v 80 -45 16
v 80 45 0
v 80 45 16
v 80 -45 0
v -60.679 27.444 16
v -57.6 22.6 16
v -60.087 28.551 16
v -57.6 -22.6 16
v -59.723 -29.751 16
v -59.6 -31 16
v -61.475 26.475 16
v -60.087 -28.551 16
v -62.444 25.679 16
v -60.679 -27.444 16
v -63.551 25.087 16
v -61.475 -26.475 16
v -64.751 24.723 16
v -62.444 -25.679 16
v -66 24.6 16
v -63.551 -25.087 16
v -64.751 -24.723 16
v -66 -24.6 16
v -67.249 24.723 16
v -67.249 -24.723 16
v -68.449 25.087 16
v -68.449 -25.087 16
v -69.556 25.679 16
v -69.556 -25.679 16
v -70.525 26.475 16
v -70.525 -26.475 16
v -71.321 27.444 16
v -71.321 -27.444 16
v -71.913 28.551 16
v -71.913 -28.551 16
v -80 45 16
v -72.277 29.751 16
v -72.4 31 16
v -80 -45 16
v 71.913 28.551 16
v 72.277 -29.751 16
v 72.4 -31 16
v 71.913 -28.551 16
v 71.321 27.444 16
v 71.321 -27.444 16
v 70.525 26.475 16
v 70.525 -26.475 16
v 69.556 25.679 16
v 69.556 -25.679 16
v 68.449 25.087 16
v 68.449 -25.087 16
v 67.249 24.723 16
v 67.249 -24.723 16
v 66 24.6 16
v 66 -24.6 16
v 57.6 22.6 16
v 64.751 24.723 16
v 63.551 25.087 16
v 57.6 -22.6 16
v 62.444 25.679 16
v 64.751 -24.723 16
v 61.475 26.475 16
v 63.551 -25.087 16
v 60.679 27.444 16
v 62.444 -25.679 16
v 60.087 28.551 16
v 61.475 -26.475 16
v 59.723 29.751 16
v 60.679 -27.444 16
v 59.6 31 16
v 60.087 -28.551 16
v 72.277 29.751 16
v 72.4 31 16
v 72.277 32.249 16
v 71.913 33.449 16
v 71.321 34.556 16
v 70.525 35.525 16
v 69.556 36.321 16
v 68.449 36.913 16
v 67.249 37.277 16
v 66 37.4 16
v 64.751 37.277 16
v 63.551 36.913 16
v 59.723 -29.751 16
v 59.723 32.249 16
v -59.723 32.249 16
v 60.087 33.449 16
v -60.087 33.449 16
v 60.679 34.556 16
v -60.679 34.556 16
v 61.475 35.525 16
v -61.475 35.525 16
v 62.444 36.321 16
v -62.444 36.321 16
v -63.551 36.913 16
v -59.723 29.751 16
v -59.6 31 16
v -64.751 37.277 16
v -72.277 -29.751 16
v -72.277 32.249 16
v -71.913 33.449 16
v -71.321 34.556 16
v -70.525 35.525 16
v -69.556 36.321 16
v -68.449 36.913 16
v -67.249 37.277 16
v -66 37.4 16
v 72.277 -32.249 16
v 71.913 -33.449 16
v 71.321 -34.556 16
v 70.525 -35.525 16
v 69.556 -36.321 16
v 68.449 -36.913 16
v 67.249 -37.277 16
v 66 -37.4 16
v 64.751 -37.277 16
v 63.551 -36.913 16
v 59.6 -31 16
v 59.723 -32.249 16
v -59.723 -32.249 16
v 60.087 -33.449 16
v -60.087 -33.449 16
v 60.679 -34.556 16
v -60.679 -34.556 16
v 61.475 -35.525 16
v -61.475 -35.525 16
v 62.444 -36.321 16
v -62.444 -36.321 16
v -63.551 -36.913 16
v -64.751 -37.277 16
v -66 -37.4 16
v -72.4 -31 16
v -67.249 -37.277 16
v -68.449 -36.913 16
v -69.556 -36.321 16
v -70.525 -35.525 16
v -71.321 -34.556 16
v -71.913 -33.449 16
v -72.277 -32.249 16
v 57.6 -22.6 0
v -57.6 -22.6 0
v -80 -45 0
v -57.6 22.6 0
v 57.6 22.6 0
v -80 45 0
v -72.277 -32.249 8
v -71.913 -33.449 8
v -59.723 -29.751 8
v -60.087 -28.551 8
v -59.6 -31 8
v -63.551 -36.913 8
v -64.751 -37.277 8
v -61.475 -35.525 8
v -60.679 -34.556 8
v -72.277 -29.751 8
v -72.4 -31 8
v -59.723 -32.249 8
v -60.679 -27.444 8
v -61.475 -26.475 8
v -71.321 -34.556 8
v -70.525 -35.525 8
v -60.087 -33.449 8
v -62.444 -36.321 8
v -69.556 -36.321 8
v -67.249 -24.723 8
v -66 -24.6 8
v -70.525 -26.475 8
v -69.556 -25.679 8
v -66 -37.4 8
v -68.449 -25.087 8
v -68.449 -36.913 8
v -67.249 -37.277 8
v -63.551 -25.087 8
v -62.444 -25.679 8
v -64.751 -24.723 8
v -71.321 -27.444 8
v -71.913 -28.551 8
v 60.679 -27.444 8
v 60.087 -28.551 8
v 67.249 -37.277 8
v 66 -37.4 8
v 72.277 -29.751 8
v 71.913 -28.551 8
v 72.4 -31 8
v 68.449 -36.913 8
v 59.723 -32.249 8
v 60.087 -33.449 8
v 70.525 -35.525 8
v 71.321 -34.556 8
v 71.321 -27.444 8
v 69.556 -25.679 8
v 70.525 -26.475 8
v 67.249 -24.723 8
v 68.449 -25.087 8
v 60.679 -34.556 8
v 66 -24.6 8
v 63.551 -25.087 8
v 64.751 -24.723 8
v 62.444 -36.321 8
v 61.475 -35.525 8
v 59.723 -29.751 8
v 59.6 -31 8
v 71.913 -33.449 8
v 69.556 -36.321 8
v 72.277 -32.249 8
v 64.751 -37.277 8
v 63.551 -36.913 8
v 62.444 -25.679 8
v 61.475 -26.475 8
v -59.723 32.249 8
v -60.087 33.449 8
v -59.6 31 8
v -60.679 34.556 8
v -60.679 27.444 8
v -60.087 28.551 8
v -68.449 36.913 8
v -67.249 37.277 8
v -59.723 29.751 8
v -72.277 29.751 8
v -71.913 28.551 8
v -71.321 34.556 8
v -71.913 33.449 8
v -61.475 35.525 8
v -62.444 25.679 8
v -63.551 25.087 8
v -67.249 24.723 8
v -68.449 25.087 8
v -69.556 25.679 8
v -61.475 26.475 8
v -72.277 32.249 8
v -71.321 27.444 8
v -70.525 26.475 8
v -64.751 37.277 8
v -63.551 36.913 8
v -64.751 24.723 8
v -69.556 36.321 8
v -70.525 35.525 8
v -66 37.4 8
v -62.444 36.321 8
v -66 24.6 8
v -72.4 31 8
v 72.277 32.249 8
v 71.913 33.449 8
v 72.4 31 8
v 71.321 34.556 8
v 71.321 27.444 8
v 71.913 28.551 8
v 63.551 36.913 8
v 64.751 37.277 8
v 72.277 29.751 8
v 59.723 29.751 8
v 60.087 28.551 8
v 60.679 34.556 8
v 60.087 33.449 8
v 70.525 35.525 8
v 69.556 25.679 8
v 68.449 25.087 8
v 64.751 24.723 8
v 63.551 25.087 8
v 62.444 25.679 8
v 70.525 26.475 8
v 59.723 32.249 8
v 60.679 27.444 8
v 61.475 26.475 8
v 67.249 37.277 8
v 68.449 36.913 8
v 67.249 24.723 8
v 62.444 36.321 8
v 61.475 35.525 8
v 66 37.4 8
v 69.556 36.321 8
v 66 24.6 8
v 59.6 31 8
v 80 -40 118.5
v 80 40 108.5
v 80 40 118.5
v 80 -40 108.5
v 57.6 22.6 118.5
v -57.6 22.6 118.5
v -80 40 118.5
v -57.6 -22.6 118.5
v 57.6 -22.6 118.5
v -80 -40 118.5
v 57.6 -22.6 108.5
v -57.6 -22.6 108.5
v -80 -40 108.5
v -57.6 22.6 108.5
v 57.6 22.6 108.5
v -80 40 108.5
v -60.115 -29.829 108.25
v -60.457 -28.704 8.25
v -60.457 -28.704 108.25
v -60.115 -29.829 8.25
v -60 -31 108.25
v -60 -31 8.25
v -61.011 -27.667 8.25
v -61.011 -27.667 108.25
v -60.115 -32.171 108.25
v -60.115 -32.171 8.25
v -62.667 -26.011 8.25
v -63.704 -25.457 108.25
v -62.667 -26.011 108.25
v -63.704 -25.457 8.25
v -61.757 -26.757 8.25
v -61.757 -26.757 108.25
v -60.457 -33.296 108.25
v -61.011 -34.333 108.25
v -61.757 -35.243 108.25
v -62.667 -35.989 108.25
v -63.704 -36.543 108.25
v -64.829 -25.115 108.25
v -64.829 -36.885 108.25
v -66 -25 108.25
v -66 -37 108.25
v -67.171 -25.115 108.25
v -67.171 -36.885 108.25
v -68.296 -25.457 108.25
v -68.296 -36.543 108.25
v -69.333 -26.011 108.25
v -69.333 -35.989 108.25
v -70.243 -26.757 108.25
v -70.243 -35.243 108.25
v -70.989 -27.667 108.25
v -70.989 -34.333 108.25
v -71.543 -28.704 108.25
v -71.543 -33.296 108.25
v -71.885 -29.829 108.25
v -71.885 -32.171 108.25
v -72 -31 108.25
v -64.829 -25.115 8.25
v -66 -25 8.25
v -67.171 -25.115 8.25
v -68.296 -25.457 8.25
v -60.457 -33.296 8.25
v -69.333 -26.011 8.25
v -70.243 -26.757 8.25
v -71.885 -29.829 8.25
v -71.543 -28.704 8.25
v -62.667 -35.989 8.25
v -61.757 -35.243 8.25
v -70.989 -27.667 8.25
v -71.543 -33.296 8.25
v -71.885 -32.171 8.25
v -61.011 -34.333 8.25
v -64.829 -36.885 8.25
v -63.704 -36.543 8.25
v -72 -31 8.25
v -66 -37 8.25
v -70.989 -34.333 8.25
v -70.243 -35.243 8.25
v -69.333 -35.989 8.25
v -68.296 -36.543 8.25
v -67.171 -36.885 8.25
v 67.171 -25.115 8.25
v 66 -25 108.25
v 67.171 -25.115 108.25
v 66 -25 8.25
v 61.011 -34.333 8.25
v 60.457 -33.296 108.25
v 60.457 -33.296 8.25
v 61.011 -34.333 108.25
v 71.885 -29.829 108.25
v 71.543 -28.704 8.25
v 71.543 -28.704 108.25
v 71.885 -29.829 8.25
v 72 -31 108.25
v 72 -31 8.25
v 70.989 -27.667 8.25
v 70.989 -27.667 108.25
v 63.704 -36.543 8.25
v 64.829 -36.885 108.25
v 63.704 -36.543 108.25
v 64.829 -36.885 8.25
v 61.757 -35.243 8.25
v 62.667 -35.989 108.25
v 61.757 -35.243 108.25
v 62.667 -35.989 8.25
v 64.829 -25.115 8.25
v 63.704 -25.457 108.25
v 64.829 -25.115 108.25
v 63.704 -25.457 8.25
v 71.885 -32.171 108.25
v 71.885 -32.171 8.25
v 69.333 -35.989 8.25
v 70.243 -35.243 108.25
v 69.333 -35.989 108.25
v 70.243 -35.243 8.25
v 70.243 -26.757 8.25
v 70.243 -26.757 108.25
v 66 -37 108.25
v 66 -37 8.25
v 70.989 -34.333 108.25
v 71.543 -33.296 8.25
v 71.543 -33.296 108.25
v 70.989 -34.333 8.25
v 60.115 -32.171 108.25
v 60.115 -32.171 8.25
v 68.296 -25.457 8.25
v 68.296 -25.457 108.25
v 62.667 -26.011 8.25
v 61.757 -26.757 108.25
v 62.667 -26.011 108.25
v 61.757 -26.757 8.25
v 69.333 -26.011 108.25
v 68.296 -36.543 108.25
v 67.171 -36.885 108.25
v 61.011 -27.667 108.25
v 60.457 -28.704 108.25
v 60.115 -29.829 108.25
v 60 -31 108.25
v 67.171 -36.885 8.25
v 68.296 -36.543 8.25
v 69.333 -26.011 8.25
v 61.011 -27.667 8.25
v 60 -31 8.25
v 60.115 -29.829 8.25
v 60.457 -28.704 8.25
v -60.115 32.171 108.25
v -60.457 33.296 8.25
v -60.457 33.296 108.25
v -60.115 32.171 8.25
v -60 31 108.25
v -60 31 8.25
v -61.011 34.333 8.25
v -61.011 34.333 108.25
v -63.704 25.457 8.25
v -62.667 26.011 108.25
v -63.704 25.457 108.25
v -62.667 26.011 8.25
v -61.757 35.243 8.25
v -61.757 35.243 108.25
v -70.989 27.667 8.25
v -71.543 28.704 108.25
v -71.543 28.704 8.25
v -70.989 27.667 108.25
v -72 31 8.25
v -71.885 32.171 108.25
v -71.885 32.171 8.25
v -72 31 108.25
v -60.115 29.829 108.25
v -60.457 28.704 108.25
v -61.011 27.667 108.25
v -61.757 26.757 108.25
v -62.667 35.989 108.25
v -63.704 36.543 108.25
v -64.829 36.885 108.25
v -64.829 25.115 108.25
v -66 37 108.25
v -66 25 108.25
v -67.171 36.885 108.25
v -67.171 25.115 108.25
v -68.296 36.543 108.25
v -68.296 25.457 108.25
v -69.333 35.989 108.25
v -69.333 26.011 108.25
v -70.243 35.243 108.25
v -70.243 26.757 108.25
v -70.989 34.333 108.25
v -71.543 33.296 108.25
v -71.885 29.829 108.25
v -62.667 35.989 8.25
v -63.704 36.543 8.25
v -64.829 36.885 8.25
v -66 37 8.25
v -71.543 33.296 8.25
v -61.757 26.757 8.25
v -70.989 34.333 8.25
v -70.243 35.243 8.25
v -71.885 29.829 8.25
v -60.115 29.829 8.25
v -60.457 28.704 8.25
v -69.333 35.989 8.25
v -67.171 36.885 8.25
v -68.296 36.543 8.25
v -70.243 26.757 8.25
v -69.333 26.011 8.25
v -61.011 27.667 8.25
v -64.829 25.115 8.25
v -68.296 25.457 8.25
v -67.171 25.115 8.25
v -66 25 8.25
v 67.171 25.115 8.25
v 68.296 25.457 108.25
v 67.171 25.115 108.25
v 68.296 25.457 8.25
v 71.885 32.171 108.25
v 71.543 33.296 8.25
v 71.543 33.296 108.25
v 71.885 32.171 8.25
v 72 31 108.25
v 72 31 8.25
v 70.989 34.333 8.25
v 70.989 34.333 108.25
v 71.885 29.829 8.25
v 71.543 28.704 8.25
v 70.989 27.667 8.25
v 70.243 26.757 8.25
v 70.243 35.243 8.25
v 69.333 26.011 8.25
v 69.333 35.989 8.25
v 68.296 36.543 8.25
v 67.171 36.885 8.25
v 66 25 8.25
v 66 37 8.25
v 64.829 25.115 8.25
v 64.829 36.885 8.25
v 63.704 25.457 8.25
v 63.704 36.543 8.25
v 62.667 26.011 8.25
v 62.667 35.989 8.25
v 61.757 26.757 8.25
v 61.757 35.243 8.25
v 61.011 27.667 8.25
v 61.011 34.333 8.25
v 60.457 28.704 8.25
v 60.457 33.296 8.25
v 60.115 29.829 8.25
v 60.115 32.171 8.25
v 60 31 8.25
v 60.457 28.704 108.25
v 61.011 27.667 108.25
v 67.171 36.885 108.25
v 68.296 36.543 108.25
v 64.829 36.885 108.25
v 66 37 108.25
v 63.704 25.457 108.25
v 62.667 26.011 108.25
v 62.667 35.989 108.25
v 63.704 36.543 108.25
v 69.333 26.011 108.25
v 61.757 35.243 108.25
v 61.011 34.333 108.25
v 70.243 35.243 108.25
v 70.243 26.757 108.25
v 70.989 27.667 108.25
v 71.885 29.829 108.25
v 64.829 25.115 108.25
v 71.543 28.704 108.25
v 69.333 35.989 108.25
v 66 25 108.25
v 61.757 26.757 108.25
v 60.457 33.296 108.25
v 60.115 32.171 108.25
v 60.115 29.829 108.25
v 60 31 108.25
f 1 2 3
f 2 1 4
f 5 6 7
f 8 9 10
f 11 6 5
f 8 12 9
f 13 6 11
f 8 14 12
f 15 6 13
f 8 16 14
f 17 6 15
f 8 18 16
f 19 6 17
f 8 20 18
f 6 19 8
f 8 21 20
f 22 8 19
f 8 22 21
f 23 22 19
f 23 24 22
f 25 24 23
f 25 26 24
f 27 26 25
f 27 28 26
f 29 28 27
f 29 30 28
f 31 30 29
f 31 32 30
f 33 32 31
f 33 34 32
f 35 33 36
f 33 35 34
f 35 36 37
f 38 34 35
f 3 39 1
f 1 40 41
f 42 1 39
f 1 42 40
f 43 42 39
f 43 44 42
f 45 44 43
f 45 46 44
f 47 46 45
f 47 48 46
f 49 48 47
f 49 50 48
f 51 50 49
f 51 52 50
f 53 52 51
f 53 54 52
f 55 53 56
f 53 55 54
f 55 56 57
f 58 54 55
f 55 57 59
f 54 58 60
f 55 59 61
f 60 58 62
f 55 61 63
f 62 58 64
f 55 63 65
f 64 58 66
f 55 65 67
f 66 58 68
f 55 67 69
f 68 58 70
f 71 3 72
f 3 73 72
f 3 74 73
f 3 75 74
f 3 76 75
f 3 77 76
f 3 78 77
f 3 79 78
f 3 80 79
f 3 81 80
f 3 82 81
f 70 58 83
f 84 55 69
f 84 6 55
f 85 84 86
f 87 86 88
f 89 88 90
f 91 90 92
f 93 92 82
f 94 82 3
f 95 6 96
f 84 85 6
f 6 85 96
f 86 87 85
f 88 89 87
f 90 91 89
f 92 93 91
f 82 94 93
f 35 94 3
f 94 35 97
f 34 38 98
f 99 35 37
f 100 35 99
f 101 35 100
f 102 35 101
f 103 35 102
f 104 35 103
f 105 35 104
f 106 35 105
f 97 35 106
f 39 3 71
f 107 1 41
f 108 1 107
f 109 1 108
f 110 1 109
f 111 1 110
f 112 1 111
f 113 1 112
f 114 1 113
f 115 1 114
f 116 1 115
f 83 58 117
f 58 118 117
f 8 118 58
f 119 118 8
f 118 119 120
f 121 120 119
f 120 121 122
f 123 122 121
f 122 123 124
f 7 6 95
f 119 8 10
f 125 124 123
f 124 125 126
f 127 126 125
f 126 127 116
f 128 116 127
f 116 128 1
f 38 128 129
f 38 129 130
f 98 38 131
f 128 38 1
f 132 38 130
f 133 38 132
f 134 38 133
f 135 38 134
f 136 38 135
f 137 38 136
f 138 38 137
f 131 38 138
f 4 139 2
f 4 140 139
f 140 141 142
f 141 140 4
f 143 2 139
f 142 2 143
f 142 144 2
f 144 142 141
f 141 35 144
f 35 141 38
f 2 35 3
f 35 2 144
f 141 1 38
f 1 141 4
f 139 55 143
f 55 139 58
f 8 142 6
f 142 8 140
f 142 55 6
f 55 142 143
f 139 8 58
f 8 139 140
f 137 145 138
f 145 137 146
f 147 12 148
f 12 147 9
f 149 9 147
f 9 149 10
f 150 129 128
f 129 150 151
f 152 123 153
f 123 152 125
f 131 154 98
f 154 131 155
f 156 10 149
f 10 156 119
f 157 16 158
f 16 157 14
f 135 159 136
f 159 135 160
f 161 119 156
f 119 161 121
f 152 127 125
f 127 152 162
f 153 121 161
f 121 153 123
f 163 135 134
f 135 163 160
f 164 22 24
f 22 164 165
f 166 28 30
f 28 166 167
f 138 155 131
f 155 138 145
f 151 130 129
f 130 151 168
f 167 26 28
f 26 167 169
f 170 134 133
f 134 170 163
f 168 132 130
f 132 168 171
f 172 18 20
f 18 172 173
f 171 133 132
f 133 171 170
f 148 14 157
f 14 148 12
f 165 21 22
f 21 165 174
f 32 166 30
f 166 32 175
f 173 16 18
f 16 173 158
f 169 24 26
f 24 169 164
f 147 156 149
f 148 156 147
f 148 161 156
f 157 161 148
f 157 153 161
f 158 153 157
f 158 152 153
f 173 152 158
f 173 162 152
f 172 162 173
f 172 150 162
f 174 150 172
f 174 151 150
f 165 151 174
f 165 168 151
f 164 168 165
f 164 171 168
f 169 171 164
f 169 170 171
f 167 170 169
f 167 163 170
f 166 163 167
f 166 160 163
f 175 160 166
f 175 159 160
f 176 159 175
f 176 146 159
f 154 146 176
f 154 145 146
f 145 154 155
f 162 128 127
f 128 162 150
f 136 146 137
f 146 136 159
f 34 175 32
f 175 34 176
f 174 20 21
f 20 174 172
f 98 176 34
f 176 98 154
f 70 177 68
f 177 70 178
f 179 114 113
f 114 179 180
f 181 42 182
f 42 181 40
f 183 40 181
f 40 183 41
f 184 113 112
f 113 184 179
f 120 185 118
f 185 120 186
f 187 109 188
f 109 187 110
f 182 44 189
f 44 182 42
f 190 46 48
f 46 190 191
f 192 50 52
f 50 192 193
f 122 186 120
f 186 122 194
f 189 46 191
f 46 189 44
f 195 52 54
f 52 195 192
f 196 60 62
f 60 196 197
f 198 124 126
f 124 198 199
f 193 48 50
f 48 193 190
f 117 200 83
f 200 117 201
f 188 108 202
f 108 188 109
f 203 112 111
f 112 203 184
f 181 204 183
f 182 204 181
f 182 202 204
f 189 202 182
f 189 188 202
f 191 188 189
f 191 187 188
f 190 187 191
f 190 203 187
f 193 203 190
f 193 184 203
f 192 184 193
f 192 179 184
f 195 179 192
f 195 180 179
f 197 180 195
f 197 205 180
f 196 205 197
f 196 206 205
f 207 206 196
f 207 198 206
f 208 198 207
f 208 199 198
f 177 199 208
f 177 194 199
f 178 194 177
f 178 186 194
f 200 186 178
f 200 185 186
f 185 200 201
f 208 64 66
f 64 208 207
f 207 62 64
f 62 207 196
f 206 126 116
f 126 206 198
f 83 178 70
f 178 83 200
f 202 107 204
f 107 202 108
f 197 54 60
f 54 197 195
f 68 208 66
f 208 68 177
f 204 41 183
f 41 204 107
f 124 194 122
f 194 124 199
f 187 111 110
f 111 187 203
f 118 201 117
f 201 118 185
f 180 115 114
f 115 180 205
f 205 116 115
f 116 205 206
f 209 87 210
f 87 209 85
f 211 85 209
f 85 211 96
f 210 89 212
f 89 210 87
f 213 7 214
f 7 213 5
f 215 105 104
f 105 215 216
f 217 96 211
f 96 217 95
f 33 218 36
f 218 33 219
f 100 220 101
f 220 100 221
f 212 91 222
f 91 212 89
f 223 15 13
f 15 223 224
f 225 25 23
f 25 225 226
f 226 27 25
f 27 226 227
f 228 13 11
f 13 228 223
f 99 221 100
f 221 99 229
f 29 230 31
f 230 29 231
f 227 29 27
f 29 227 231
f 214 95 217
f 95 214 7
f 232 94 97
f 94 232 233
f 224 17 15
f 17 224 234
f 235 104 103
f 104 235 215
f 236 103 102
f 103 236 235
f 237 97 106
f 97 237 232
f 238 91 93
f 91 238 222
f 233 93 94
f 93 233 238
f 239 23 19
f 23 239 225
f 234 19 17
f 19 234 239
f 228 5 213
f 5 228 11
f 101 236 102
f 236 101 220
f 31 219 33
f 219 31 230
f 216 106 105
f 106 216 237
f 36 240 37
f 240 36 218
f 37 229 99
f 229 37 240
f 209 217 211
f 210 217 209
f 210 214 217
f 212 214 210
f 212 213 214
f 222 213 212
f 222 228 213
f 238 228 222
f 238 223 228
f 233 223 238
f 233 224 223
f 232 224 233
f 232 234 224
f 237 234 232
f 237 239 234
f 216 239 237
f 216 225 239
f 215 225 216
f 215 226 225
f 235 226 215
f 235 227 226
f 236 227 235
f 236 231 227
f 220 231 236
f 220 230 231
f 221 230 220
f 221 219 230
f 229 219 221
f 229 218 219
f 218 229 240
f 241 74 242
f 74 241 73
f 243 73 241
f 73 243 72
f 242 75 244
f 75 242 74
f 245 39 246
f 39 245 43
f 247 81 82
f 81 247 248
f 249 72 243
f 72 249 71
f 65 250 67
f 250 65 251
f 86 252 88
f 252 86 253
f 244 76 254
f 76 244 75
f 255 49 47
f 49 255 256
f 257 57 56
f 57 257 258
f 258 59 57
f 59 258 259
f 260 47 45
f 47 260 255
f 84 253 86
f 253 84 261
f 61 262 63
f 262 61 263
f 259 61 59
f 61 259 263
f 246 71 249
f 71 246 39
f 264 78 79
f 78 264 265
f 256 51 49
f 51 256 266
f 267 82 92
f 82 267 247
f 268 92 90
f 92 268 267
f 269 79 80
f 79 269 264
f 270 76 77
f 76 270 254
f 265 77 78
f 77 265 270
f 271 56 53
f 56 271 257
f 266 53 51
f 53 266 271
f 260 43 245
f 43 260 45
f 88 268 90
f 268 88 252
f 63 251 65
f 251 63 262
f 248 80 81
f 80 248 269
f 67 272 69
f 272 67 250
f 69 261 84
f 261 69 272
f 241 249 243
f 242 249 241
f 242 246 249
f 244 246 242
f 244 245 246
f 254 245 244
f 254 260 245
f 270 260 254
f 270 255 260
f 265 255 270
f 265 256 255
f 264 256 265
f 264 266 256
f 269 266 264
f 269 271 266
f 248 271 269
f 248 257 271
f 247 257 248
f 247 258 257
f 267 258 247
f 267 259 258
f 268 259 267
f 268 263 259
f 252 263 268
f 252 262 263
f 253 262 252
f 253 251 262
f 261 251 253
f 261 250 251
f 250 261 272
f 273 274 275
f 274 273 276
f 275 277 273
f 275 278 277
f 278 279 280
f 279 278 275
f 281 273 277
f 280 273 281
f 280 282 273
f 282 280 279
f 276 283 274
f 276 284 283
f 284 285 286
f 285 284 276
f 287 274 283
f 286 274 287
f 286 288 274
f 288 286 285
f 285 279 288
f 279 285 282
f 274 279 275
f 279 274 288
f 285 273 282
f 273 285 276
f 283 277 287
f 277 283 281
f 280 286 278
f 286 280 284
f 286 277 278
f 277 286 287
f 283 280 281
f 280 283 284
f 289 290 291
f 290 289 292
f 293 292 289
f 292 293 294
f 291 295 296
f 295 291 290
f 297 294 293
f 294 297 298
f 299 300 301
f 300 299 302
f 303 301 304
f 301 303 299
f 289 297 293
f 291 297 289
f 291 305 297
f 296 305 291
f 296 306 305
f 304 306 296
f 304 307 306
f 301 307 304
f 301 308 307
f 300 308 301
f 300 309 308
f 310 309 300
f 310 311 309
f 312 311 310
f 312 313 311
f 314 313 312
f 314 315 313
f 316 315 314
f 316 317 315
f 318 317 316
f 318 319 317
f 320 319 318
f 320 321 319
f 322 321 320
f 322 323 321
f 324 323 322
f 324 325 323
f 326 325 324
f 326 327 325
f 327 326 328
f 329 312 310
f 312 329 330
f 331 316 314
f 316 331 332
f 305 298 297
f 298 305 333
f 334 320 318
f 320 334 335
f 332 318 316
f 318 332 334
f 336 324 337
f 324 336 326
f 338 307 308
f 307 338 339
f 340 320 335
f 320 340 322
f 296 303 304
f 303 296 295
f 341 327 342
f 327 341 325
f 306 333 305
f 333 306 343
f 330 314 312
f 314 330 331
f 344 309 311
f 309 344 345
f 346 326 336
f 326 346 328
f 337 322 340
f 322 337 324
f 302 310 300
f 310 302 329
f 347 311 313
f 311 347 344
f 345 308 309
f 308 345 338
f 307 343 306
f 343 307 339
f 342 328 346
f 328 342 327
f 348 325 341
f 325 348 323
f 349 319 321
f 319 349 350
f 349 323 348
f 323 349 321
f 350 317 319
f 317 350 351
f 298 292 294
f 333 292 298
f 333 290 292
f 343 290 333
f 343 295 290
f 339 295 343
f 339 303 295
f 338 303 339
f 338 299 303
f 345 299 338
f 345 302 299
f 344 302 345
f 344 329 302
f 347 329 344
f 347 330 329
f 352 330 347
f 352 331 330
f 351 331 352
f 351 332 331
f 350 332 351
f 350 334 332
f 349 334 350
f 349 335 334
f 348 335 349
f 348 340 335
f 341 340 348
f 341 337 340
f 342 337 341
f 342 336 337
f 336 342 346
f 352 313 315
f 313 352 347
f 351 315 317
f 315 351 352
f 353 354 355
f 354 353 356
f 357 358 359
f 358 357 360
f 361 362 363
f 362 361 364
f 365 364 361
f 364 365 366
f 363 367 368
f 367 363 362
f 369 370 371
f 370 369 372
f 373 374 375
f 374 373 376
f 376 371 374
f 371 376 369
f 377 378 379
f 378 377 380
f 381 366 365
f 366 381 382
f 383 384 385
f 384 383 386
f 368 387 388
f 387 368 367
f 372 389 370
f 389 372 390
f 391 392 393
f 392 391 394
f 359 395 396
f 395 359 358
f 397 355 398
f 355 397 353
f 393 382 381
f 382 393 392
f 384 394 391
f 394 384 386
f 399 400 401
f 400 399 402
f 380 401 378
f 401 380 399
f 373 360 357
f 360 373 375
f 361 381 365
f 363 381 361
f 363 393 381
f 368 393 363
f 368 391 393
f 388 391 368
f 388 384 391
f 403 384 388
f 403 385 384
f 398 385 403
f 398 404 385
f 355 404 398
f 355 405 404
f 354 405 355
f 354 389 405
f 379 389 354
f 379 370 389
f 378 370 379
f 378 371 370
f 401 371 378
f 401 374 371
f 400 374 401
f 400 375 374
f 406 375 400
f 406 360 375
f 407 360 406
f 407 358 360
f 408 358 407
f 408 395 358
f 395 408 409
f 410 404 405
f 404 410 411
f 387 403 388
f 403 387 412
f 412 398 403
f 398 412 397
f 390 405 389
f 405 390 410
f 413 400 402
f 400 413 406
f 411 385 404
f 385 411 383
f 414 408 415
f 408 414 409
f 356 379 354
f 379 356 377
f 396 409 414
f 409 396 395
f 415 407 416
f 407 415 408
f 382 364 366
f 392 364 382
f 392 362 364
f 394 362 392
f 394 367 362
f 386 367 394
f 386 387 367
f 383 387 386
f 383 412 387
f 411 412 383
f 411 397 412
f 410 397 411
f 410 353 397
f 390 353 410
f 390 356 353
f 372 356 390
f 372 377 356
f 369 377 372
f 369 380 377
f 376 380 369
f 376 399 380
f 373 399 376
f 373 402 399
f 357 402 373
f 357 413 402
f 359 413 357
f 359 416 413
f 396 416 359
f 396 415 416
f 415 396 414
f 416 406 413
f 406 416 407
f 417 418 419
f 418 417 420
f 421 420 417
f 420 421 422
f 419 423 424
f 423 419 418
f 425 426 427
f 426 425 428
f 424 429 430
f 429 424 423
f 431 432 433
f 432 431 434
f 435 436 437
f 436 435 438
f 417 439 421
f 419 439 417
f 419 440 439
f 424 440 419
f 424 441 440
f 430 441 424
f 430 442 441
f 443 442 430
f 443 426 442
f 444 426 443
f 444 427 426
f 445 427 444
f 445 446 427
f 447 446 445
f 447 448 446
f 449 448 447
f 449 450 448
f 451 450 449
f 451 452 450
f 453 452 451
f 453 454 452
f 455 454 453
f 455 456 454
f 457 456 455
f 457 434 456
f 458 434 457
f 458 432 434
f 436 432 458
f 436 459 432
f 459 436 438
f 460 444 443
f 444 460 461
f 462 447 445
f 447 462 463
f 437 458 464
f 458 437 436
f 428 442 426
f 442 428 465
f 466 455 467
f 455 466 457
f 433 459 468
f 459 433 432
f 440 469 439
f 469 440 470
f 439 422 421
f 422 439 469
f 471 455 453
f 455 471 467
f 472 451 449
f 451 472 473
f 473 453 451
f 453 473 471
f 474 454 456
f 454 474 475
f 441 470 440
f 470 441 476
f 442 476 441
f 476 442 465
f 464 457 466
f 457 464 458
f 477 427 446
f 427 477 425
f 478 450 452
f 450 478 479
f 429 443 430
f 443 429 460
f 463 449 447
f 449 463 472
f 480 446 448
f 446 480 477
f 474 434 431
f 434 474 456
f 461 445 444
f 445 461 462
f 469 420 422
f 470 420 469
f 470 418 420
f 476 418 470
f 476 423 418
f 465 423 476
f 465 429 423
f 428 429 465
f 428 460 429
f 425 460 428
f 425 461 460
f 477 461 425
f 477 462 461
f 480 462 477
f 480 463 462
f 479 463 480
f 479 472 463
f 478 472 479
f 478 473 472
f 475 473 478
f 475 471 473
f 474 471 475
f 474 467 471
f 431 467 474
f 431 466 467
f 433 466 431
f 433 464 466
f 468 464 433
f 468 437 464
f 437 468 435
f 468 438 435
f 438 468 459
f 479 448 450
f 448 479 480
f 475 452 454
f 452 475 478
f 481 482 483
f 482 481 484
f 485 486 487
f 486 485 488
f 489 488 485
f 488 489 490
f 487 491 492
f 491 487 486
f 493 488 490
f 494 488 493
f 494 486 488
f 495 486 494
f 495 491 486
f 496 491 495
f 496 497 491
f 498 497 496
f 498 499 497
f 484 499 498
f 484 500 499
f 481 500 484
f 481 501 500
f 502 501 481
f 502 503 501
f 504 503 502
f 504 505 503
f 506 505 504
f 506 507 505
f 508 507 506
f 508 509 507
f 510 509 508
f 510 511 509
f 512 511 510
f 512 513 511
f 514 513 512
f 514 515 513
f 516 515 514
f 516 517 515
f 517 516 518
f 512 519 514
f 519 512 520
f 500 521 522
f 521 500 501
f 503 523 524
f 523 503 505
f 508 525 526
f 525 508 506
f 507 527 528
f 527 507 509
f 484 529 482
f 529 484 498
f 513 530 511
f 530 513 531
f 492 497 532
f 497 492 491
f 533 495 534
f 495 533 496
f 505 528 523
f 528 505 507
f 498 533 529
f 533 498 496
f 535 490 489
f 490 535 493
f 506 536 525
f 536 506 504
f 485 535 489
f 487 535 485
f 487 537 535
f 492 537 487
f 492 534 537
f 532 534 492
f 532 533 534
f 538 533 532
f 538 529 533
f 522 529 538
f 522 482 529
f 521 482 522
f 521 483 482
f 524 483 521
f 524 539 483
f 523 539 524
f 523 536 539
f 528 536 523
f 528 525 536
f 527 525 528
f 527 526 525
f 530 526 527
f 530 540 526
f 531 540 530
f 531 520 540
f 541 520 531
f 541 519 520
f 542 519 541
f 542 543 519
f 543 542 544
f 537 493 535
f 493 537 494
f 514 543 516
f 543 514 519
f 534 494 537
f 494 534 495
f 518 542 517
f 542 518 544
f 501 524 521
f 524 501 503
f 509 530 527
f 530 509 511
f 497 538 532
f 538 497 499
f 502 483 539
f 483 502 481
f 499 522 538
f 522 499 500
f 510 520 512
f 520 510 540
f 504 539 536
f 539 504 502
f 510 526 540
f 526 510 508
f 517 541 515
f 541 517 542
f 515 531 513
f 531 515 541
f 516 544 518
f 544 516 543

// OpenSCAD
$fn = 32;

// ------------------------------------------------------------------------
// Frame cube: base 160 x 90 mm, posts 100 mm tall
// Every part is its own module, assembly() places every instance.
// ------------------------------------------------------------------------

// --- part 1 ---
module base_frame() {
  difference() {
    translate([-80, -45, 0]) cube([160, 90, 16]);
    translate([-57.6, -22.6, -1]) cube([115.2, 45.2, 18]);
    translate([-66, -31, 8]) cylinder(h = 9, d = 12.8);
    translate([66, -31, 8]) cylinder(h = 9, d = 12.8);
    translate([-66, 31, 8]) cylinder(h = 9, d = 12.8);
    translate([66, 31, 8]) cylinder(h = 9, d = 12.8);
  }
}

// --- part 2 ---
module corner_post() {
  cylinder(h = 100, d = 12);
}

// --- part 3 ---
module top_frame() {
  difference() {
    translate([-80, -40, 0]) cube([160, 80, 10]);
    translate([-57.6, -22.6, -1]) cube([115.2, 45.2, 12]);
  }
}

// --- assembly ---
module assembly() {
  color([0.80, 0.24, 0.20]) translate([0, 0, 0]) rotate([0, 0, 0]) base_frame();
  color([0.20, 0.45, 0.75]) translate([-66, -31, 8.25]) rotate([0, 0, 0]) corner_post();
  color([0.25, 0.62, 0.32]) translate([66, -31, 8.25]) rotate([0, 0, 0]) corner_post();
  color([0.92, 0.70, 0.18]) translate([-66, 31, 8.25]) rotate([0, 0, 0]) corner_post();
  color([0.58, 0.35, 0.70]) translate([66, 31, 8.25]) rotate([0, 0, 0]) corner_post();
  color([0.16, 0.66, 0.66]) translate([0, 0, 108.5]) rotate([0, 0, 0]) top_frame();
}

assembly();
